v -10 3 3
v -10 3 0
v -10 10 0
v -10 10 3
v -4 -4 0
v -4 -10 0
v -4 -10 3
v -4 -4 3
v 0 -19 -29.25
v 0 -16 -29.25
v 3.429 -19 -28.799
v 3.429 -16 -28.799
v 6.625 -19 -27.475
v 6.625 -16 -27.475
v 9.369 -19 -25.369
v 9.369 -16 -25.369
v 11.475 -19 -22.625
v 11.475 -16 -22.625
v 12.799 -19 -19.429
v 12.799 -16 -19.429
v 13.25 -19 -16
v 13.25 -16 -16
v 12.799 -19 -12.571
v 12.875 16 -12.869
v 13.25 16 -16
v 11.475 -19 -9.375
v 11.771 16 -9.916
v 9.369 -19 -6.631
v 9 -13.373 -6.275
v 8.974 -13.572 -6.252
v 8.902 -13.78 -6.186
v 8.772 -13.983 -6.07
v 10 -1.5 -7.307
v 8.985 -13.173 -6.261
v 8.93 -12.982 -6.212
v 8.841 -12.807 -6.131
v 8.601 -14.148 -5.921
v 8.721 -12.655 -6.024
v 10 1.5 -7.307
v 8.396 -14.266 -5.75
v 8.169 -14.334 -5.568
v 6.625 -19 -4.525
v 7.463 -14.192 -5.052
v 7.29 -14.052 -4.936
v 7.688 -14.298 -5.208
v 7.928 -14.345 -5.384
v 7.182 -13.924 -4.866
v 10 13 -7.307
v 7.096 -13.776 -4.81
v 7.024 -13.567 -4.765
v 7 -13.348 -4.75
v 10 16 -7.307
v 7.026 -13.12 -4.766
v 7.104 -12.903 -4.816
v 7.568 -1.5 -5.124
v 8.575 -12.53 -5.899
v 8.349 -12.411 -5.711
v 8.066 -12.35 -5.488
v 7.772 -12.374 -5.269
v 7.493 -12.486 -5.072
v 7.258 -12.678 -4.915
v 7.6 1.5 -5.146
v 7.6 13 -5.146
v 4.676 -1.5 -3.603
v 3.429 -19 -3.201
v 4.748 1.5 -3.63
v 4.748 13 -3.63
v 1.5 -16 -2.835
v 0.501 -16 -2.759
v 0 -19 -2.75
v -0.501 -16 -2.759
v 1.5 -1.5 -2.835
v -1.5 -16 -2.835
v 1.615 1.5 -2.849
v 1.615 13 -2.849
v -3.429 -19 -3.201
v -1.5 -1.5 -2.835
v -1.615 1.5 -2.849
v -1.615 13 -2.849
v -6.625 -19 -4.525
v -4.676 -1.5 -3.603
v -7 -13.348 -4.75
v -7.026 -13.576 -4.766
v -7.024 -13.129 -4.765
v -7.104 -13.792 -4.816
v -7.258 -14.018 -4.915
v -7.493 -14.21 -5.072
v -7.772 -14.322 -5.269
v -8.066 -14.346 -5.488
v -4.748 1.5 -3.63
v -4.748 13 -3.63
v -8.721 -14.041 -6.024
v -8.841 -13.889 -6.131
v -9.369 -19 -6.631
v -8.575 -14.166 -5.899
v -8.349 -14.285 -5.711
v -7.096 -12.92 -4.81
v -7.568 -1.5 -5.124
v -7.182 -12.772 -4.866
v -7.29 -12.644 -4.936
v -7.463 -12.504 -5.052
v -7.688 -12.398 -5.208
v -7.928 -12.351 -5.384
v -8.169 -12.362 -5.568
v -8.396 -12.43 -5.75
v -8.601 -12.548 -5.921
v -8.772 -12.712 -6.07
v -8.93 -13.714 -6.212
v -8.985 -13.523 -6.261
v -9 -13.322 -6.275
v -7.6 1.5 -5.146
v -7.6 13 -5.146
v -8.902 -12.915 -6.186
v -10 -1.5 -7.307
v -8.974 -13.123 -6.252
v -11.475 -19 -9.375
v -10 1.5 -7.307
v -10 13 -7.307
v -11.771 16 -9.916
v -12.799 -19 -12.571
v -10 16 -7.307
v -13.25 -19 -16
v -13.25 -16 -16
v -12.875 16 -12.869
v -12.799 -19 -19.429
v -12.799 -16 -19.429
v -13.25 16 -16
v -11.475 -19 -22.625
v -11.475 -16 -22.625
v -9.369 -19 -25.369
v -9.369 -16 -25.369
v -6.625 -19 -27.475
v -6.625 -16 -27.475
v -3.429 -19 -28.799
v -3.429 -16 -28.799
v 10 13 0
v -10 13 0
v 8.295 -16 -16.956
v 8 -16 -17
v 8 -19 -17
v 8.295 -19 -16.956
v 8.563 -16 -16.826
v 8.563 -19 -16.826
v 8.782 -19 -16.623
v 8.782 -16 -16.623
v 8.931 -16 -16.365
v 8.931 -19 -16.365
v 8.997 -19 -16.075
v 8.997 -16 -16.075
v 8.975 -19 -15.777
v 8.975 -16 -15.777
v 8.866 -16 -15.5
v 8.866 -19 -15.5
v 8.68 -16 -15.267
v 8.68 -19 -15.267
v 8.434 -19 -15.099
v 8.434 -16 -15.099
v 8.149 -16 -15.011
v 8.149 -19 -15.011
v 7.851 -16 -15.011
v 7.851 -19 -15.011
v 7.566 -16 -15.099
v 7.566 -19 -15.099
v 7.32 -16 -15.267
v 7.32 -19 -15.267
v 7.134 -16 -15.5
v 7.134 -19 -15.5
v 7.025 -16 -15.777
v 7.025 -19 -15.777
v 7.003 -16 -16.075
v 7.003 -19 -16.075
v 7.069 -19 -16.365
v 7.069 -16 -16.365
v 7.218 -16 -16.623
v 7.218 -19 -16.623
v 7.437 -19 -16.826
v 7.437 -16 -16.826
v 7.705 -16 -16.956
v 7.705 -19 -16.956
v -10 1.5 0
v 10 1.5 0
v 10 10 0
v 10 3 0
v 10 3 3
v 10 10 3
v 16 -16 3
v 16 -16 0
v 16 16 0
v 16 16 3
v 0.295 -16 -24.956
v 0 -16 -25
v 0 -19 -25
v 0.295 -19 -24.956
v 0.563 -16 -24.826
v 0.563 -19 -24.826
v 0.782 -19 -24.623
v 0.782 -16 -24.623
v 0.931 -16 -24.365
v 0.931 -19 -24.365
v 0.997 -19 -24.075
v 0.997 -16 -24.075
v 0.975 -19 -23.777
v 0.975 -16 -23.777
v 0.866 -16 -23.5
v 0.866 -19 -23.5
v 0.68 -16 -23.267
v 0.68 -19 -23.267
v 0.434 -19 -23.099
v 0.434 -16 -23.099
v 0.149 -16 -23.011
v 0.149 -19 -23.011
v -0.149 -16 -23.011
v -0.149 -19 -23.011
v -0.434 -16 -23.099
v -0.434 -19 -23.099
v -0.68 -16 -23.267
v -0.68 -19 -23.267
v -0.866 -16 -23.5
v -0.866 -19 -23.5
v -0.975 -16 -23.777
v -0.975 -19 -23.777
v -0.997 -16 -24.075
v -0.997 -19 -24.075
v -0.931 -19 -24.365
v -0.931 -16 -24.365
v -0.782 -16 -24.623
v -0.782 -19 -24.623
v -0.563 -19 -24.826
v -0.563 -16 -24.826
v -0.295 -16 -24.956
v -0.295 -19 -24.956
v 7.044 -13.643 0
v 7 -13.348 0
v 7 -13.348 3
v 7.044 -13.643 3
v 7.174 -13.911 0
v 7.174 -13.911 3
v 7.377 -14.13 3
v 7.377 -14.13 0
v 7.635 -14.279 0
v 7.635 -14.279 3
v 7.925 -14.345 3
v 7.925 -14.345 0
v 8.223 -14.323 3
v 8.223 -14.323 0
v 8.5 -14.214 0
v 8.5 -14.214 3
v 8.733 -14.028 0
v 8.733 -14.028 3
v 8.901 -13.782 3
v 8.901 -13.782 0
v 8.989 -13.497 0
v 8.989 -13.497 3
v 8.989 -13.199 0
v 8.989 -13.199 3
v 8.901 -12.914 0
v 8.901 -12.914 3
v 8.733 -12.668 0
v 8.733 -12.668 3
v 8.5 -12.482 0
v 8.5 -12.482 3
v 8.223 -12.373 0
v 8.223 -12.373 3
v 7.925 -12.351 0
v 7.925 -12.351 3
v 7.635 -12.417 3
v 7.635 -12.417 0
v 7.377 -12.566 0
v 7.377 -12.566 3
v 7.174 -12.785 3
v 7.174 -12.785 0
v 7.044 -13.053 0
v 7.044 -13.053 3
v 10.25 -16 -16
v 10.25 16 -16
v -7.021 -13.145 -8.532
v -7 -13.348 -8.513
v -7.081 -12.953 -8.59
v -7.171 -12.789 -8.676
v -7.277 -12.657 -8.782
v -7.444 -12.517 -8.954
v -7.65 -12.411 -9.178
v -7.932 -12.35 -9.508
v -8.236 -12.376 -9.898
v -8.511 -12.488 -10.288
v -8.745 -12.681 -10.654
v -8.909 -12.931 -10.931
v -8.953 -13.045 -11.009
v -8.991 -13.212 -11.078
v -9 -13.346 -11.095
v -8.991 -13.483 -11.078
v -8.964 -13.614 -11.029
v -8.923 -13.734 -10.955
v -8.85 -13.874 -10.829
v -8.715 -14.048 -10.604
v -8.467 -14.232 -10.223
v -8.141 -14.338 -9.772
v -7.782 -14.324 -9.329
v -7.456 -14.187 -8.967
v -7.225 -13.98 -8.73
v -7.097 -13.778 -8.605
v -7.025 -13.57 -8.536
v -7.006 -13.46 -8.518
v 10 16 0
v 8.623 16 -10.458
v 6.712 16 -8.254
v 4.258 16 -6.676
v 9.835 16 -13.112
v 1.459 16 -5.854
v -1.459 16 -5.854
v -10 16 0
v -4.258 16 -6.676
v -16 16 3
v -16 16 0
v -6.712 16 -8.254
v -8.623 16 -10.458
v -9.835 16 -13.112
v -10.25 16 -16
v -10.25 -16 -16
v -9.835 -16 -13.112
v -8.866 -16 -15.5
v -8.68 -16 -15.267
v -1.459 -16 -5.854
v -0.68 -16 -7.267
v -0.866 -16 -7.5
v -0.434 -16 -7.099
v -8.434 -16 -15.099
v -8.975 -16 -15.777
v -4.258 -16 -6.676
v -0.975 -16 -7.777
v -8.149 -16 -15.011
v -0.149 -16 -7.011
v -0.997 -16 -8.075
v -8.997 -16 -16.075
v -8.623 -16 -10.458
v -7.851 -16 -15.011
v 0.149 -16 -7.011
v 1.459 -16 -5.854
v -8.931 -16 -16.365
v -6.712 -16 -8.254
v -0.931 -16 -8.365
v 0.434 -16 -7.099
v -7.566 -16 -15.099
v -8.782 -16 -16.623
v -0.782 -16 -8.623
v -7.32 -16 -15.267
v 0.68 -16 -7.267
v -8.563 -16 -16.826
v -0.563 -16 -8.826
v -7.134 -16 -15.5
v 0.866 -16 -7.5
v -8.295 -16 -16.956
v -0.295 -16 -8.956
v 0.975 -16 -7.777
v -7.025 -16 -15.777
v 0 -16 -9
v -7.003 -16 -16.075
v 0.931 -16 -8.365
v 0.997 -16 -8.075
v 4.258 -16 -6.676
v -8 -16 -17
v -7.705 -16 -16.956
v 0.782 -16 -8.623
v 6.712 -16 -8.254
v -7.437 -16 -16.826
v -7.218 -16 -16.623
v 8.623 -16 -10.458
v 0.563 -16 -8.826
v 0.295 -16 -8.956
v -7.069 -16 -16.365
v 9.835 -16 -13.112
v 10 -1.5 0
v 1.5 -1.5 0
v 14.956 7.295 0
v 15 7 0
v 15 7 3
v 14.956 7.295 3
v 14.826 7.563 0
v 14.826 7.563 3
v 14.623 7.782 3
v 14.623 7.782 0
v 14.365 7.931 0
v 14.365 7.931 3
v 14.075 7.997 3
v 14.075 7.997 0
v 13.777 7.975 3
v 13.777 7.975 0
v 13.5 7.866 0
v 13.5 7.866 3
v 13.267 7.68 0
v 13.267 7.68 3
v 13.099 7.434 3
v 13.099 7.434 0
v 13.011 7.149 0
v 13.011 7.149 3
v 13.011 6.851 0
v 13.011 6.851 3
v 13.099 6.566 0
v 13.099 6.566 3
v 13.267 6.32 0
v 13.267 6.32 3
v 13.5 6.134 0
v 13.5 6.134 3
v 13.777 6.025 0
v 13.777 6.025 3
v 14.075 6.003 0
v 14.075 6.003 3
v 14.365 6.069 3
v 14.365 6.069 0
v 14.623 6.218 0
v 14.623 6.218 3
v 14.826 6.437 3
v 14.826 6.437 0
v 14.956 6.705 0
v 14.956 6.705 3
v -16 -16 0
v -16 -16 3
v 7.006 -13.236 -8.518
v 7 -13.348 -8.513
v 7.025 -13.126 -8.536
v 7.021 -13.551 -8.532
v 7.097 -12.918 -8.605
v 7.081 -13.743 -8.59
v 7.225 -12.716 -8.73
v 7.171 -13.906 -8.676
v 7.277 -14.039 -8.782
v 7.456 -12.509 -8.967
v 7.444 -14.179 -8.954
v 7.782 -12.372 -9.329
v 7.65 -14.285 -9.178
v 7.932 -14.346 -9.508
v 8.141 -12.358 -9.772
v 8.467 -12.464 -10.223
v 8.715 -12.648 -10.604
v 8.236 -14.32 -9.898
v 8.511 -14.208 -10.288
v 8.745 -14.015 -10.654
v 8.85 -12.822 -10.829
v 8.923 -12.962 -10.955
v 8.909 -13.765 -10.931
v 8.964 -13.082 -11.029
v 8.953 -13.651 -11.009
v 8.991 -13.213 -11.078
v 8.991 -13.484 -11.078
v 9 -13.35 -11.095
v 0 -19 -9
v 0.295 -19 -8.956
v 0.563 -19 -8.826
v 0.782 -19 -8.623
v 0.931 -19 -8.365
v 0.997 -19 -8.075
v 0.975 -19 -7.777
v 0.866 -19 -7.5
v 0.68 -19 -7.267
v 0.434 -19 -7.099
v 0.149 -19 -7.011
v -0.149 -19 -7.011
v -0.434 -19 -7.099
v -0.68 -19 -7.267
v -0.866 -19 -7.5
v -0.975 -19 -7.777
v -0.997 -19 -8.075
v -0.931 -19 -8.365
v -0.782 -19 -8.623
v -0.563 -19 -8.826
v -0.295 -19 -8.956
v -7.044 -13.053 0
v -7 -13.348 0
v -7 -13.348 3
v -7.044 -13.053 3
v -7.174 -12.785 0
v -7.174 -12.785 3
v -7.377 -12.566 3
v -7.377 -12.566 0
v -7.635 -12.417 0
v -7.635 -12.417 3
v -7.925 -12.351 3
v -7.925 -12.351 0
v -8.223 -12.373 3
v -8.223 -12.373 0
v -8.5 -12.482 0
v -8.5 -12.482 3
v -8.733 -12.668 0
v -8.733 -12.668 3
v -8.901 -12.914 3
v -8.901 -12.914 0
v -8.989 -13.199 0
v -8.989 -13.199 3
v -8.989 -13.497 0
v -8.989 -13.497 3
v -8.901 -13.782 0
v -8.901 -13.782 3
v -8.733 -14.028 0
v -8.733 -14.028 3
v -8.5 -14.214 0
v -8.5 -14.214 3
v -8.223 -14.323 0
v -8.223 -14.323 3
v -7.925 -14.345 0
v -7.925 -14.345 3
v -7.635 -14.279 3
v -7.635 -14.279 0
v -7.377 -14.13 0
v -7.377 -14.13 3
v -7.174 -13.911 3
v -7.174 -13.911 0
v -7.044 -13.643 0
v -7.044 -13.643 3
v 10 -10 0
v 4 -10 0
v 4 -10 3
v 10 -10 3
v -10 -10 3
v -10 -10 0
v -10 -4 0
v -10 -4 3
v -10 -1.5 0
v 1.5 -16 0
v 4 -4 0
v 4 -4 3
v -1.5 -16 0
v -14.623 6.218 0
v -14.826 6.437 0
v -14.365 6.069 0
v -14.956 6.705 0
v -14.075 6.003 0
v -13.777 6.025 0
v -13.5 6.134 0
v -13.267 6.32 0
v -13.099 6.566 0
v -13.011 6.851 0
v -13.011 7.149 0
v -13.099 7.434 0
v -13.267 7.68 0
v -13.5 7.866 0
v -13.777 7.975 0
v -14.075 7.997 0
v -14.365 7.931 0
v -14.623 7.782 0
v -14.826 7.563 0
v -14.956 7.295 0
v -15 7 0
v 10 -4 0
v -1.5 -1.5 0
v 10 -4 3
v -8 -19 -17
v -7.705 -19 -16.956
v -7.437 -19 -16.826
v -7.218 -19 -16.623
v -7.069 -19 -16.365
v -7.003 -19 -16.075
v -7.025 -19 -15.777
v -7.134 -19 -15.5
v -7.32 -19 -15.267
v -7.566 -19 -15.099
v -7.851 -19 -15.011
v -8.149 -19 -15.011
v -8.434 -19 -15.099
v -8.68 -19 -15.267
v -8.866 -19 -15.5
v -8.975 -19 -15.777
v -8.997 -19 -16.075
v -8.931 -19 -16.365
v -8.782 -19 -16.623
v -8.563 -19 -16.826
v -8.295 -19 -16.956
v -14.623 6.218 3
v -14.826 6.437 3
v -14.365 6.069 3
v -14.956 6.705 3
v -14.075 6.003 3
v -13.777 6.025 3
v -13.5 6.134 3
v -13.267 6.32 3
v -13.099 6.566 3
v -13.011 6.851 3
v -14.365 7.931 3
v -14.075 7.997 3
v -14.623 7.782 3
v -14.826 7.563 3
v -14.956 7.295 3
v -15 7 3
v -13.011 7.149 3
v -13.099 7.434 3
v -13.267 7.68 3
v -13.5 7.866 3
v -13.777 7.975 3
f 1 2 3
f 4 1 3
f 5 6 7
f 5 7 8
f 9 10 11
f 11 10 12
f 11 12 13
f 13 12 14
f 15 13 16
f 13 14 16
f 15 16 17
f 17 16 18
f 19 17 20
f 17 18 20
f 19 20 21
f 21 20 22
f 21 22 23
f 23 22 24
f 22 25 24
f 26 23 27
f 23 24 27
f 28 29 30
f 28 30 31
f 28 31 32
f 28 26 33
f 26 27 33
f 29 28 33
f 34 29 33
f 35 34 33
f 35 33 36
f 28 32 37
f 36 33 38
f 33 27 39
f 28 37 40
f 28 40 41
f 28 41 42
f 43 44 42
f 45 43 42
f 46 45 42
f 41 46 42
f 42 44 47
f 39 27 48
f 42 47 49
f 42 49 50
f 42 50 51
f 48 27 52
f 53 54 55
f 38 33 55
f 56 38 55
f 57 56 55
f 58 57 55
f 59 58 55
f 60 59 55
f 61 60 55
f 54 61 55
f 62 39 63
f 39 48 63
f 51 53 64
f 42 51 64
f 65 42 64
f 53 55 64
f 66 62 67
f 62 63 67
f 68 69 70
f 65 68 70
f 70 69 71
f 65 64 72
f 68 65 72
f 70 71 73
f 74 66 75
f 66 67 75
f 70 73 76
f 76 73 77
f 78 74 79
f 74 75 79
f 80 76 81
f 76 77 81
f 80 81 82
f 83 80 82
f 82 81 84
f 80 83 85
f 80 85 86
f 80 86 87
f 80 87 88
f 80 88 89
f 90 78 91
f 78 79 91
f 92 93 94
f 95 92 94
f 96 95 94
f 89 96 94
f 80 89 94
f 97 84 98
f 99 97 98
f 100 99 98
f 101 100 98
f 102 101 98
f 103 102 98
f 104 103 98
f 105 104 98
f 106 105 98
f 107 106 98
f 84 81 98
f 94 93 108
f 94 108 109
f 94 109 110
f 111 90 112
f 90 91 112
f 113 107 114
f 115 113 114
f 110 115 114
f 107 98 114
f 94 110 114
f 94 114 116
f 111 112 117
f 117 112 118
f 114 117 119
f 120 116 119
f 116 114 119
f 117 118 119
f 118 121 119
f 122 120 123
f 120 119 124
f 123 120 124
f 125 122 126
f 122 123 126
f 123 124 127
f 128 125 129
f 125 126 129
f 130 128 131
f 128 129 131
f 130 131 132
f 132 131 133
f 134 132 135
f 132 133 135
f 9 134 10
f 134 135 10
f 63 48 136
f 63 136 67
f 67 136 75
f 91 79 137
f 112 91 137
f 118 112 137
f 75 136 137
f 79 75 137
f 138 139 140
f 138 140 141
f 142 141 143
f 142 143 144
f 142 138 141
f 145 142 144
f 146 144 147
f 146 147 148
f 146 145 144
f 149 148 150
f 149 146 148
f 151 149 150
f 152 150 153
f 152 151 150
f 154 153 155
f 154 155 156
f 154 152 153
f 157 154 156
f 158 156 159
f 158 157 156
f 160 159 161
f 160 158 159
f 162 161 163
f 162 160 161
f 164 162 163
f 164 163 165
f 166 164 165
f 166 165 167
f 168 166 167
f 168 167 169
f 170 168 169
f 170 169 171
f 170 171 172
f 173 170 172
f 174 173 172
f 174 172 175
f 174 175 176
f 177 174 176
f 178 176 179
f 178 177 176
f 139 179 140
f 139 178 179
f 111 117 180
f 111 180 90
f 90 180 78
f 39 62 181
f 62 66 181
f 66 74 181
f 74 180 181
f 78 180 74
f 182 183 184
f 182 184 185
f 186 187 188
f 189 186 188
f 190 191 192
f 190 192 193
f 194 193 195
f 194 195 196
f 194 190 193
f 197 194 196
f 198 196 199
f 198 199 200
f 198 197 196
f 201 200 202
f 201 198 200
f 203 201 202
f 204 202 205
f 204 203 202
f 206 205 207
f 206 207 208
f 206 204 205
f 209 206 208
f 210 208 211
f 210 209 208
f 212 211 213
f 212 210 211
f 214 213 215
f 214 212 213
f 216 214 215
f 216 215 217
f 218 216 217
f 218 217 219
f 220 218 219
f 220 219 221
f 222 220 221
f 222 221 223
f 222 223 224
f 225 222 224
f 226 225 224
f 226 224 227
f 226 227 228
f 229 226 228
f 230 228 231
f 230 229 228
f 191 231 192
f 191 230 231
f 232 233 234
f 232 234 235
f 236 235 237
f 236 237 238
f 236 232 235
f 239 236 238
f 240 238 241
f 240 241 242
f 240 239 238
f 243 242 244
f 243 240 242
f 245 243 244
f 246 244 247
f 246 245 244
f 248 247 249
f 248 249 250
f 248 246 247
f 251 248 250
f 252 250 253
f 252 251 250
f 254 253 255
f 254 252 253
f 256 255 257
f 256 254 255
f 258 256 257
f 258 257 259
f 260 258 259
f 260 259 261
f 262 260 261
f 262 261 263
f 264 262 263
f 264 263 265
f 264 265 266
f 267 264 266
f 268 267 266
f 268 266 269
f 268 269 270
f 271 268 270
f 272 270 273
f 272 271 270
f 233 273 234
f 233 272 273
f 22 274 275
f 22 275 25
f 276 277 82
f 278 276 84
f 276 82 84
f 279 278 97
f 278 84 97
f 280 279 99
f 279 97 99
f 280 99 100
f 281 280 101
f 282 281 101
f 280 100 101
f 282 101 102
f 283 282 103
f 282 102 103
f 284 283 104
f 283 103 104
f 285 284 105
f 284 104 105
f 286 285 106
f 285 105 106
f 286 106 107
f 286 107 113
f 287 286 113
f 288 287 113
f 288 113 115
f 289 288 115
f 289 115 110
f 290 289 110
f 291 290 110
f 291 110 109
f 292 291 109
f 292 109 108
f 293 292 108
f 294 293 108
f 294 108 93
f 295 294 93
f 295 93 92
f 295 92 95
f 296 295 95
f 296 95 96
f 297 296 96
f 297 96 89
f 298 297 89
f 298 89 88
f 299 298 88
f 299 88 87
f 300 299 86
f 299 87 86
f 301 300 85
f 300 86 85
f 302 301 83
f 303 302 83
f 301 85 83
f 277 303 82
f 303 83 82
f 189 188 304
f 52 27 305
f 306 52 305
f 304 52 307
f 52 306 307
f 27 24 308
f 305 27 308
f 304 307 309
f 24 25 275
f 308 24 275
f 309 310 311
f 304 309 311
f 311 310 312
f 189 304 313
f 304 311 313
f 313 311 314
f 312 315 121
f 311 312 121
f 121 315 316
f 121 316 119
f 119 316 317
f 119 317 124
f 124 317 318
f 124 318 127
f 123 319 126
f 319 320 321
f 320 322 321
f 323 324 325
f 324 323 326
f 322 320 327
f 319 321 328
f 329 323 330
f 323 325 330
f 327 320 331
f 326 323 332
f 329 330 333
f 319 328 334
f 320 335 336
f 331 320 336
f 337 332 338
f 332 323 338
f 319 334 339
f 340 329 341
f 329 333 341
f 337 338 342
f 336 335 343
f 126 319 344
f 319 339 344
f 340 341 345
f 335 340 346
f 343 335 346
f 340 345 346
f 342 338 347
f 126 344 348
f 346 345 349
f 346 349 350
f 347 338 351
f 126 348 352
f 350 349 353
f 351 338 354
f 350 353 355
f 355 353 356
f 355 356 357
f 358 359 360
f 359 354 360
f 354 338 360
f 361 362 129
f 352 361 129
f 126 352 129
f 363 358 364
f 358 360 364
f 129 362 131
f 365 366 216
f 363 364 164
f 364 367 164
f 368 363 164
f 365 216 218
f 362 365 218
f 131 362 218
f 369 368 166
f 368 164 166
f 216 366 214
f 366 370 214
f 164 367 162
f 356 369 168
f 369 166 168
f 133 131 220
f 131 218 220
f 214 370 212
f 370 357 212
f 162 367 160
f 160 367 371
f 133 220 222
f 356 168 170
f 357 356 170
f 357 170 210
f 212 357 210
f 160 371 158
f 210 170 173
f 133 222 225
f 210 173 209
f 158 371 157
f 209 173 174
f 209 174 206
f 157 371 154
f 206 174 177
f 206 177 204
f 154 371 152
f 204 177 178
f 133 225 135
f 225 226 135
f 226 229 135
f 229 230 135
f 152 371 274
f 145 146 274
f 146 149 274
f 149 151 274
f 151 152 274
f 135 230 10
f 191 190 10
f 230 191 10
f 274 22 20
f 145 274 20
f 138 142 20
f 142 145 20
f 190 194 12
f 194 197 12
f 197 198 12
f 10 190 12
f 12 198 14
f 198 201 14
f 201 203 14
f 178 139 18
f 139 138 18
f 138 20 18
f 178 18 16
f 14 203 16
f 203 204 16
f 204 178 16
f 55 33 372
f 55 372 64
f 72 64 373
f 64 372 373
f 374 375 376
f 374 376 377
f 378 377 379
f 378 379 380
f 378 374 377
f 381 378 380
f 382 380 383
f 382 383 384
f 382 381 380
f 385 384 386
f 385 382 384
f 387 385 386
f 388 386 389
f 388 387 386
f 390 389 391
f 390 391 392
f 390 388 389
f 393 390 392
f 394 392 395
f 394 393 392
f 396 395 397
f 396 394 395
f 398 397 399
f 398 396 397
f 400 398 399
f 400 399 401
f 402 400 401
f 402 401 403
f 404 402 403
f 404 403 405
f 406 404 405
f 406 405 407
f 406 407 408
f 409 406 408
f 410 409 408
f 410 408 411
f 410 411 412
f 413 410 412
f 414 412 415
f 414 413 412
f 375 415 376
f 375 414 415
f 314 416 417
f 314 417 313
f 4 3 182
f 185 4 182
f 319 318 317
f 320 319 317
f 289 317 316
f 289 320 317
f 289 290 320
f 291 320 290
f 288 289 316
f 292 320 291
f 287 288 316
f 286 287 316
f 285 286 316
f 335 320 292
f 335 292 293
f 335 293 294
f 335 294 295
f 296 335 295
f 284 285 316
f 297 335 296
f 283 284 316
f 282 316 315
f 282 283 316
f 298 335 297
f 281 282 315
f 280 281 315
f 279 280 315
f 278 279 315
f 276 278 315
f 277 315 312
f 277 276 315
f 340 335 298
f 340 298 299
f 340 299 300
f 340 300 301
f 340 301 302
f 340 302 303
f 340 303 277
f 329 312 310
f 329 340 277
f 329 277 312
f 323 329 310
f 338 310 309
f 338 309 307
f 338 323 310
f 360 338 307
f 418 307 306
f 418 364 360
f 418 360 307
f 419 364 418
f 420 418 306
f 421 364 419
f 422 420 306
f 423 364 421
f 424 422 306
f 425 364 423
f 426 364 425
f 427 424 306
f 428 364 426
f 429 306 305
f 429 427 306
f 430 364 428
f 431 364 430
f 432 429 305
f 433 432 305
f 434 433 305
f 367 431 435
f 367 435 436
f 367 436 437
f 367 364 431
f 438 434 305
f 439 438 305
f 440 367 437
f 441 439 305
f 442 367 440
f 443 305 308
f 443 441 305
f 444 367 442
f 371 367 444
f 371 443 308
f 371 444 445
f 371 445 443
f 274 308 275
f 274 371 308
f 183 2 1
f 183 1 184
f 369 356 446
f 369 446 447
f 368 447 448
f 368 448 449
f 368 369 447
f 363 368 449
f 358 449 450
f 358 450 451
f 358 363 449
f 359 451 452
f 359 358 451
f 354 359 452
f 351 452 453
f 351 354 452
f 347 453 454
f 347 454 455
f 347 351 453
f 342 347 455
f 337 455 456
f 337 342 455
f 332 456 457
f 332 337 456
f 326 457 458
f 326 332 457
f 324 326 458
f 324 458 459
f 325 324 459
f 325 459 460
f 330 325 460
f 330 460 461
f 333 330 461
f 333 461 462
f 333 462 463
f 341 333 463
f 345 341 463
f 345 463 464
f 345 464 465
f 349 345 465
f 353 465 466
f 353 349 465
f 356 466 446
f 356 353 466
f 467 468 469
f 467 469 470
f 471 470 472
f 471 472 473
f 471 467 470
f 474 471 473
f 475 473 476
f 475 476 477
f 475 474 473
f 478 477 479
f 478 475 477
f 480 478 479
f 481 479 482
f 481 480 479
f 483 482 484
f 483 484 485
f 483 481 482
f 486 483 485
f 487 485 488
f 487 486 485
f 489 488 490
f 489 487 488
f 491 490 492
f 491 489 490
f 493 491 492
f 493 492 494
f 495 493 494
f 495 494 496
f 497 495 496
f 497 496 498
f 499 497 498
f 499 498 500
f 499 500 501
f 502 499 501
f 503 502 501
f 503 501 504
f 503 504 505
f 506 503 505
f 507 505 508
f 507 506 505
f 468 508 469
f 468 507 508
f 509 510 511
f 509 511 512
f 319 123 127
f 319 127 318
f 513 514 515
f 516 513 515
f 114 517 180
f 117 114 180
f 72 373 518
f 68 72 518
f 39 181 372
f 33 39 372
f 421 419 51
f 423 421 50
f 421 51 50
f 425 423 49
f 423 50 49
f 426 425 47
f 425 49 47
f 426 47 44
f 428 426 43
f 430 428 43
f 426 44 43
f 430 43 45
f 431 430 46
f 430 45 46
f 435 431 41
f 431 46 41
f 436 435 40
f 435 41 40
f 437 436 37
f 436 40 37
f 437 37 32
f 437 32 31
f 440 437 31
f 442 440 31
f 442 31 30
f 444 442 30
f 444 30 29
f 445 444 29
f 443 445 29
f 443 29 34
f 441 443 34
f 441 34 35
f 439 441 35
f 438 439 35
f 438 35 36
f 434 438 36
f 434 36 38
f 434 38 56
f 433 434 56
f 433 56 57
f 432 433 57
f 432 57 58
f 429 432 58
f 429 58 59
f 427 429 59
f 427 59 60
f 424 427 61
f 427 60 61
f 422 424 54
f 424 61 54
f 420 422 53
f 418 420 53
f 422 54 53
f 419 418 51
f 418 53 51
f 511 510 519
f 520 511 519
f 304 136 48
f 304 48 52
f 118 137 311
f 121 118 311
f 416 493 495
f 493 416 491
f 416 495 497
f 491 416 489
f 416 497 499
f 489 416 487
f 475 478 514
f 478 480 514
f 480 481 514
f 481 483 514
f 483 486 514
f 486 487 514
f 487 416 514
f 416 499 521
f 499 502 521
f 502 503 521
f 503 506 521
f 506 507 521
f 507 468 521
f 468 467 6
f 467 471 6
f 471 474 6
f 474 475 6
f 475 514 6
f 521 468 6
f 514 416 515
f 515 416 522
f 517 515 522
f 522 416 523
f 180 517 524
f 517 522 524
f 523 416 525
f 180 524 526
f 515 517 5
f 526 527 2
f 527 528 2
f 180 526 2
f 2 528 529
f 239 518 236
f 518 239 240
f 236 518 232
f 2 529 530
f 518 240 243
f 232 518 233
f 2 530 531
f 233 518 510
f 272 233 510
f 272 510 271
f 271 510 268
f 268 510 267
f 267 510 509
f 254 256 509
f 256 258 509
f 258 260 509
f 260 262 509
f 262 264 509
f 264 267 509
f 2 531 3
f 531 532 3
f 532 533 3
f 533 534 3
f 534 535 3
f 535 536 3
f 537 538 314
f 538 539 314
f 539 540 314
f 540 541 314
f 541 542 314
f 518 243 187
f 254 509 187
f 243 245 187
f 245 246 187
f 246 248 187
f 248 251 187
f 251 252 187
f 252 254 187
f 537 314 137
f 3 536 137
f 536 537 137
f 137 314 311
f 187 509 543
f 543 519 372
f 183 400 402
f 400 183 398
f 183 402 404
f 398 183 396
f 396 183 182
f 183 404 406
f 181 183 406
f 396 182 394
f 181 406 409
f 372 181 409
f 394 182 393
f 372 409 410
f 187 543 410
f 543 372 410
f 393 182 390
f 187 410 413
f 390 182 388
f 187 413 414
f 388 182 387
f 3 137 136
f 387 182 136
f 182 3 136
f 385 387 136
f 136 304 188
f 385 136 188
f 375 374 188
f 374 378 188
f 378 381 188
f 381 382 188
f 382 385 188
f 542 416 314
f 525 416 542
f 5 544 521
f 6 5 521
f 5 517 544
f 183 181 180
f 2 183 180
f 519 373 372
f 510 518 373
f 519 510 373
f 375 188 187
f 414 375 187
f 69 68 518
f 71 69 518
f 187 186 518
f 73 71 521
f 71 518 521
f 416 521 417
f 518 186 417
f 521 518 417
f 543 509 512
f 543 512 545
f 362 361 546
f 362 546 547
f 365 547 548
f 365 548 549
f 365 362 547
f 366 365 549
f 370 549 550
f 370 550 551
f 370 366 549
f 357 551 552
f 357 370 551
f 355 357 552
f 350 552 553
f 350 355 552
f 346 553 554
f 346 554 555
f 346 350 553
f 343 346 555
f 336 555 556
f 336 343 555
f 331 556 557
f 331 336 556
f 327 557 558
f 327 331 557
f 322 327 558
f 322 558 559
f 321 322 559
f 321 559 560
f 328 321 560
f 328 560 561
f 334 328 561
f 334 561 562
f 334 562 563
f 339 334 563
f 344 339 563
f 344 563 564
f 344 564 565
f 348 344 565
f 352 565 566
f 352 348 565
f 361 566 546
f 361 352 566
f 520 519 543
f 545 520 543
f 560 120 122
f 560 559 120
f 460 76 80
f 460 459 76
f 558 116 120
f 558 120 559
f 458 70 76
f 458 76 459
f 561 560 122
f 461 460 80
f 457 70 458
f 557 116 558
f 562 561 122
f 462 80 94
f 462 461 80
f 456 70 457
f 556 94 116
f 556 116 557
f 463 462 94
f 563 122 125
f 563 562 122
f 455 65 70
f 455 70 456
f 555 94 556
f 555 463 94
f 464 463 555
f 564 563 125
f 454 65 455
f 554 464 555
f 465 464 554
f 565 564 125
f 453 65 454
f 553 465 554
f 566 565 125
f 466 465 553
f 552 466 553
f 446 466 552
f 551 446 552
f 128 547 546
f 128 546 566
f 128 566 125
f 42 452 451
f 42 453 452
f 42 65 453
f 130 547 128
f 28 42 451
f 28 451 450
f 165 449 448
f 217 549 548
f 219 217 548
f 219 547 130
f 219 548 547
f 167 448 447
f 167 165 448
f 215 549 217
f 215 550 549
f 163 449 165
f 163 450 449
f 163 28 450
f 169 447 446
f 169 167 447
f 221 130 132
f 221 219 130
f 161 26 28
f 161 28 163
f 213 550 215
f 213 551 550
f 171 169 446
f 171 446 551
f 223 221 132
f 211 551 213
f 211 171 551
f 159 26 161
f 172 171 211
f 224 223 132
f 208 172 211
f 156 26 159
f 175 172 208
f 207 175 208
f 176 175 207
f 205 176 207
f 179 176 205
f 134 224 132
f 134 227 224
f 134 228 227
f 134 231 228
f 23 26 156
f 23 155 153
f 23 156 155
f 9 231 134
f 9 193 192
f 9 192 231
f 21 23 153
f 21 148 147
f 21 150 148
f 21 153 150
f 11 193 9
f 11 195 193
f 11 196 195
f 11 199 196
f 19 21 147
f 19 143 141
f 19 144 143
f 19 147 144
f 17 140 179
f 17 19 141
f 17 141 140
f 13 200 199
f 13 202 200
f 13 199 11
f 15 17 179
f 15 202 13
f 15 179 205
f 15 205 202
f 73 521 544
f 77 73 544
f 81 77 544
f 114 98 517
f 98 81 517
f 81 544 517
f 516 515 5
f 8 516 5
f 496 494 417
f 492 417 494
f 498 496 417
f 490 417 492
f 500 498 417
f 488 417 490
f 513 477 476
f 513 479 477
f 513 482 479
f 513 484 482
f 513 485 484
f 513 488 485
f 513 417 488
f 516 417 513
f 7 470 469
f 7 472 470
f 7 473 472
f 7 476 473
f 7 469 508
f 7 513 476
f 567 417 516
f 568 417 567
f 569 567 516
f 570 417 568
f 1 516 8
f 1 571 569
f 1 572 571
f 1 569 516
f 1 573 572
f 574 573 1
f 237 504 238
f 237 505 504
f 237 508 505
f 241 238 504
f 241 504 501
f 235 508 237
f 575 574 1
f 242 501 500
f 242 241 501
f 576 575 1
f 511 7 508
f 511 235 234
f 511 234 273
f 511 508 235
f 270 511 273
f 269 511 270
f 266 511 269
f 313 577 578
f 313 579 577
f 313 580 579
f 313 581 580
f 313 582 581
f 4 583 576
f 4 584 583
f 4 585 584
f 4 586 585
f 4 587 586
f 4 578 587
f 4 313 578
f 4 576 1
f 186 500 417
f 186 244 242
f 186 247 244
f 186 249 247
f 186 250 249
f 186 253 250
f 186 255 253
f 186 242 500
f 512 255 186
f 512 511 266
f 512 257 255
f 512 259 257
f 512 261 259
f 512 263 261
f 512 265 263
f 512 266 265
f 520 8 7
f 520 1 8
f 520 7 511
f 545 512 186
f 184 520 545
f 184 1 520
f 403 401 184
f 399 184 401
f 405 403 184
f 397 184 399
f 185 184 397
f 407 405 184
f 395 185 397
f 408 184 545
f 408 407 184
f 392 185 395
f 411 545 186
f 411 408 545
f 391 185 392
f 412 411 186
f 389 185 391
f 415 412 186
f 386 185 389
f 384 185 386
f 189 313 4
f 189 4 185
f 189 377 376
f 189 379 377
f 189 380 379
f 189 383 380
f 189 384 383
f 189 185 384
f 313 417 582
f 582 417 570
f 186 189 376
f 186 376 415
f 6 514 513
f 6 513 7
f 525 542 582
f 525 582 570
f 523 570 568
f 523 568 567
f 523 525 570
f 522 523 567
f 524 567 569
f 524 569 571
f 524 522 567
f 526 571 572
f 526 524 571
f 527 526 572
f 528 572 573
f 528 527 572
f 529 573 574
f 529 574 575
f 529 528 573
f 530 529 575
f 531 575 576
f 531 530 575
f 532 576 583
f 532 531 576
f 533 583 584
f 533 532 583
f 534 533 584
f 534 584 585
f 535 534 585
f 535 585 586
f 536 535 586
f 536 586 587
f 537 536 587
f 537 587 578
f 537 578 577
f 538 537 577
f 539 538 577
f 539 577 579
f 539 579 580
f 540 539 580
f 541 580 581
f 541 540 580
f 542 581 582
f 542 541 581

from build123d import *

# Parameters (mm, degrees)
SKETCH1_W                = 32
SKETCH1_H                = 32
SKETCH1_R                = 1
SKETCH1_W_2              = 20
SKETCH1_H_2              = 7
SKETCH1_W_3              = 6
SKETCH1_H_3              = 6
BOSS_EXTRUDE1_DEPTH      = 3
SKETCH2_R                = 13.25
SKETCH2_R_2              = 1
BOSS_EXTRUDE2_DEPTH      = 3
BOSS_EXTRUDE3_DEPTH      = 32
BOSS_EXTRUDE4_REACH      = 40.374
BOSS_EXTRUDE4_END_RADIUS = 13.25
SKETCH4_W                = 20
SKETCH4_H                = 3
SKETCH6_R                = 1
CUT_EXTRUDE1_DEPTH       = 41.707032562


with BuildPart() as part:
    # Sketch1 → Boss-Extrude1 (new body)
    with BuildSketch(Plane.XY):
        Rectangle(SKETCH1_W, SKETCH1_H)
        with Locations((14, 7)):
            Circle(SKETCH1_R, mode=Mode.SUBTRACT)
        with Locations(Location((-14, 7, 0), (0, 0, 180))):
            Circle(SKETCH1_R, mode=Mode.SUBTRACT)
        with Locations((-8, -13.347936253)):
            Circle(SKETCH1_R, mode=Mode.SUBTRACT)
        with Locations(Location((8, -13.347936253, 0), (0, 0, 180))):
            Circle(SKETCH1_R, mode=Mode.SUBTRACT)
        with Locations((0, 6.5)):
            Rectangle(SKETCH1_W_2, SKETCH1_H_2, mode=Mode.SUBTRACT)
        with Locations((-7, -7)):
            Rectangle(SKETCH1_W_3, SKETCH1_H_3, mode=Mode.SUBTRACT)
        with Locations((7, -7)):
            Rectangle(SKETCH1_W_3, SKETCH1_H_3, mode=Mode.SUBTRACT)
    extrude(amount=BOSS_EXTRUDE1_DEPTH)



with BuildPart() as body_2:
    # Sketch2 → Boss-Extrude2 (new body)
    with BuildSketch(Plane.XZ.offset(16)):
        with Locations(Location((0, -16, 0), (0, 0, 270))):
            Circle(SKETCH2_R)
        with Locations(Location((-8, -16, 0), (0, 0, 270))):
            Circle(SKETCH2_R_2, mode=Mode.SUBTRACT)
        with Locations(Location((0, -8, 0), (0, 0, 270))):
            Circle(SKETCH2_R_2, mode=Mode.SUBTRACT)
        with Locations(Location((8, -16, 0), (0, 0, 270))):
            Circle(SKETCH2_R_2, mode=Mode.SUBTRACT)
        with Locations(Location((0, -24, 0), (0, 0, 270))):
            Circle(SKETCH2_R_2, mode=Mode.SUBTRACT)
    extrude(amount=BOSS_EXTRUDE2_DEPTH)

    # Sketch3 → Boss-Extrude3 (add)
    with BuildSketch(Plane(origin=(0, -16, 0), x_dir=(1, 0, 0), z_dir=(0, 1, 0))):
        with BuildLine():
            Line((-13.25, 16), (-10.25, 16))
            ThreePointArc((-10.25, 16), (0, 5.75), (10.25, 16))
            Line((10.25, 16), (13.25, 16))
            ThreePointArc((13.25, 16), (0, 2.75), (-13.25, 16))
        make_face()
    extrude(amount=BOSS_EXTRUDE3_DEPTH)


with BuildPart() as part_1:
    add(part.part)

    add(body_2.part)  # Boss-Extrude4 merges body 2
    # Boss-Extrude4: up to this cylinder (the profile starts outside it)
    boss_extrude4_end = Plane(origin=(0, 5.411232, -16), z_dir=(0, 1, 0)) * Cylinder(BOSS_EXTRUDE4_END_RADIUS, 126.425536, mode=Mode.PRIVATE)
    # Sketch4 → Boss-Extrude4 (add, up to the surface)
    with BuildSketch(Plane(origin=(0, 0, 0), x_dir=(-1, 0, 0), z_dir=(0, 0, -1)), mode=Mode.PRIVATE) as boss_extrude4_sk1:
        with Locations((0, 14.5)):
            Rectangle(SKETCH4_W, SKETCH4_H)
    boss_extrude4_tool1 = extrude(boss_extrude4_sk1.sketch, amount=BOSS_EXTRUDE4_REACH, mode=Mode.PRIVATE) - boss_extrude4_end
    add(boss_extrude4_tool1.solids().sort_by_distance((0, 14.5, 0))[0])
    # Sketch4 → Boss-Extrude4 (add, up to the surface)
    with BuildSketch(Plane(origin=(0, 0, 0), x_dir=(-1, 0, 0), z_dir=(0, 0, -1)), mode=Mode.PRIVATE) as boss_extrude4_sk2:
        Polygon((10, 1.5), (-10, 1.5), (-10, -1.5), (-1.5, -1.5), (-1.5, -16), (1.5, -16), (1.5, -1.5), (10, -1.5), align=None)
    boss_extrude4_tool2 = extrude(boss_extrude4_sk2.sketch, amount=BOSS_EXTRUDE4_REACH, mode=Mode.PRIVATE) - boss_extrude4_end
    add(boss_extrude4_tool2.solids().sort_by_distance((0, -3.677536, 0))[0])

    # Sketch6 → Cut-Extrude1 (cut, through all)
    with BuildSketch(Plane.XY.offset(3)):
        with Locations(Location((8, -13.347936253, 0), (0, 0, 180))):
            Circle(SKETCH6_R)
        with Locations((-8, -13.347936253)):
            Circle(SKETCH6_R)
    extrude(amount=-CUT_EXTRUDE1_DEPTH, mode=Mode.SUBTRACT)


solid = part_1.part
